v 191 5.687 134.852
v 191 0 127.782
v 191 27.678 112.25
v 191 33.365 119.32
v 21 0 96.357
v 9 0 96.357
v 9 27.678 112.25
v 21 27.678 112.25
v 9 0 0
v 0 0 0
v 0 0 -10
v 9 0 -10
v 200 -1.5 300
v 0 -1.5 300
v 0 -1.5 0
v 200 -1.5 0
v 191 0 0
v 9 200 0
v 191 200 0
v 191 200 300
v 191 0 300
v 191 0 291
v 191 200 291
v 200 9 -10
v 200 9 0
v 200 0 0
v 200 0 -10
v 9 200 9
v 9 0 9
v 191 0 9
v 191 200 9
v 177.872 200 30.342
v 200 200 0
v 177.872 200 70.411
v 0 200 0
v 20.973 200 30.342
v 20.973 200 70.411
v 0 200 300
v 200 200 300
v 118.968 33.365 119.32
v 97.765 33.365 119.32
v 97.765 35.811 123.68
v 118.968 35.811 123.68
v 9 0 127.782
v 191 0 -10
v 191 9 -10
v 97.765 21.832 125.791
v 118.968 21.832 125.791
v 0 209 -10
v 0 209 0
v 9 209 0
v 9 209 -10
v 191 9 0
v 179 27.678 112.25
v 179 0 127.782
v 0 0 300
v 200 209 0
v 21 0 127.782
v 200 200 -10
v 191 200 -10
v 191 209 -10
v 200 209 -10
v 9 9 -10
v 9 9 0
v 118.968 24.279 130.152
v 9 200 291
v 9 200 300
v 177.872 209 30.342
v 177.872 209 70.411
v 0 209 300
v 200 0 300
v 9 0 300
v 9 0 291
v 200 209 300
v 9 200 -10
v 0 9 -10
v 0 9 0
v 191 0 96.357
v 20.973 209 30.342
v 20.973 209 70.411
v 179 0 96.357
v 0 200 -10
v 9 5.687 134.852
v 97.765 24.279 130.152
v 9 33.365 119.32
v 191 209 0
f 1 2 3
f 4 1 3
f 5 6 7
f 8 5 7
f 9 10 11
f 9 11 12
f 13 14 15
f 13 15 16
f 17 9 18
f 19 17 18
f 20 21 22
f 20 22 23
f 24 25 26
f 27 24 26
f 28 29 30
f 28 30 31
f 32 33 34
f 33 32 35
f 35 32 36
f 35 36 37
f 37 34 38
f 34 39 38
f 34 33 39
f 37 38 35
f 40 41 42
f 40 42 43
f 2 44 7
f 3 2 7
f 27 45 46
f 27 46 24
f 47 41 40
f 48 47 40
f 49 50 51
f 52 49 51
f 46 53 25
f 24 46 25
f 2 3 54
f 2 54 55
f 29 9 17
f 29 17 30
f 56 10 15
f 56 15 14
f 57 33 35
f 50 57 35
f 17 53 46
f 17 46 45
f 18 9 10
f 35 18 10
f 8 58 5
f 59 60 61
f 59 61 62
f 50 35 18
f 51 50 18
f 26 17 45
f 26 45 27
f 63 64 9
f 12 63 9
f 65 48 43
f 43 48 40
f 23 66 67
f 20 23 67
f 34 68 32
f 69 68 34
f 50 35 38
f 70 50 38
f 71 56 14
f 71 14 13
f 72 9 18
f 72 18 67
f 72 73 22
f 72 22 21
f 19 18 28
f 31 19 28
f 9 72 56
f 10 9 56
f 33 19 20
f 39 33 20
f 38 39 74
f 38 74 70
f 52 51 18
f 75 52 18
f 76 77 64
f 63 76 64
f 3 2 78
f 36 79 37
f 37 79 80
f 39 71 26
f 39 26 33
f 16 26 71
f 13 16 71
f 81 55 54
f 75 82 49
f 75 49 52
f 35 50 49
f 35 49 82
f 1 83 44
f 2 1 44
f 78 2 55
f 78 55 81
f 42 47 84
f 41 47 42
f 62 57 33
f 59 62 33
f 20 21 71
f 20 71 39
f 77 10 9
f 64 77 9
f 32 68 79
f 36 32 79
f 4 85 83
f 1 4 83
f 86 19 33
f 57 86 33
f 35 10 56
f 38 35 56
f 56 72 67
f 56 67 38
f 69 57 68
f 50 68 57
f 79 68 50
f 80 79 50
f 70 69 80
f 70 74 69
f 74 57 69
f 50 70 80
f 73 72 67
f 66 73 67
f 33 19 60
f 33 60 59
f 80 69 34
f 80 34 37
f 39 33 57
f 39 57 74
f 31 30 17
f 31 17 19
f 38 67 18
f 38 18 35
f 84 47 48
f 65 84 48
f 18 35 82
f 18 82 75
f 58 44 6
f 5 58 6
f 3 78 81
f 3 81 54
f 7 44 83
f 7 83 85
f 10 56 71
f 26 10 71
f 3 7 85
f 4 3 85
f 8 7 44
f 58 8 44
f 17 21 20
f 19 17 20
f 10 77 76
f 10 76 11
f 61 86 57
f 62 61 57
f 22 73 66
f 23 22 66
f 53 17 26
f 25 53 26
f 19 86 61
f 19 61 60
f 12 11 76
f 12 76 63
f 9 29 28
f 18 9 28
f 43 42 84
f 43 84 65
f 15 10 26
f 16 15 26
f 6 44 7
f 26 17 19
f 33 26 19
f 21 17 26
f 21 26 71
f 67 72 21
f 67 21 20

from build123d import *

# Parameters (mm, degrees)
F0_W      = 200
F0_H      = 300
F1_DEPTH  = 1.5
F2_W      = 9
F2_H      = 300
F3_DEPTH  = 200
F5_DEPTH  = 12
F7_DEPTH  = 182
F8_W      = 21.2037339807
F8_H      = 13.2238465644
F9_DEPTH  = 5
F11_DEPTH = 12
F12_W     = 200
F12_H     = 9
F13_DEPTH = 182
F14_W     = 200
F14_H     = 9
F15_DEPTH = 182
F16_W     = 200
F16_H     = 300
F17_DEPTH = 9
F18_W     = 200
F18_H     = 300
F19_DEPTH = 9
F20_W     = 156.8991802633
F20_H     = 40.0696396828
F21_DEPTH = 9
F22_W     = 9
F22_H     = 9
F23_DEPTH = 10


with BuildPart() as f1:
    # F0 (on Front) → F1 (new body)
    with BuildSketch(Plane.XZ):
        with Locations((100, 150)):
            Rectangle(F0_W, F0_H)
    extrude(amount=F1_DEPTH)


with BuildPart() as f3:
    # F2 (on face) → F3 (new body)
    with BuildSketch(Plane(origin=(0, 0, 0), x_dir=(-1, 0, 0), z_dir=(0, 1, 0))):
        with Locations((-4.5, 150)):
            Rectangle(F2_W, F2_H)
    extrude(amount=F3_DEPTH)


with BuildPart() as f5:
    # F4 (on face) → F5 (new body)
    with BuildSketch(Plane.YZ.offset(9)):
        Polygon((0, 127.7815699577), (0, 96.3572561741), (27.6775900275, 112.250007689), align=None)
    extrude(amount=F5_DEPTH)


with BuildPart() as f7:
    # F6 (on face) → F7 (new body)
    with BuildSketch(Plane.YZ.offset(9)):
        Polygon((0, 127.7815699577), (27.6775900275, 112.250007689), (33.3645287901, 119.3200424314), (5.6869387627, 134.8516047001), align=None)
    extrude(amount=F7_DEPTH)


with BuildPart() as f9:
    # F8 (on face) → F9 (new body)
    with BuildSketch(Plane(origin=(0, 58.9125639544, 104.9835016197), x_dir=(1, 0, 0), z_dir=(0, 0.489373421, 0.8720743402))):
        with Locations((108.366433531, -35.9076312136)):
            Rectangle(F8_W, F8_H)
    extrude(amount=F9_DEPTH)


with BuildPart() as f11:
    # F10 (on face) → F11 (new body)
    with BuildSketch(Plane.YZ.offset(191)):
        Polygon((0, 127.7815699577), (0, 96.3572561741), (27.6775900275, 112.250007689), align=None)
    extrude(amount=-F11_DEPTH)


with BuildPart() as f13:
    # F12 (on face) → F13 (new body)
    with BuildSketch(Plane.YZ.offset(9)):
        with Locations((100, 295.5)):
            Rectangle(F12_W, F12_H)
    extrude(amount=F13_DEPTH)


with BuildPart() as f15:
    # F14 (on face) → F15 (new body)
    with BuildSketch(Plane.YZ.offset(9)):
        with Locations((100, 4.5)):
            Rectangle(F14_W, F14_H)
    extrude(amount=F15_DEPTH)


with BuildPart() as f17:
    # F16 (on face) → F17 (new body)
    with BuildSketch(Plane.YZ.offset(191)):
        with Locations((100, 150)):
            Rectangle(F16_W, F16_H)
    extrude(amount=F17_DEPTH)


with BuildPart() as f19:
    # F18 (on face) → F19 (new body)
    with BuildSketch(Plane(origin=(0, 200, 0), x_dir=(-1, 0, 0), z_dir=(0, 1, 0))):
        with Locations((-100, 150)):
            Rectangle(F18_W, F18_H)
    extrude(amount=F19_DEPTH)

    # F20 (on face) → F21 (cut)
    with BuildSketch(Plane(origin=(0, 209, 0), x_dir=(-1, 0, 0), z_dir=(0, 1, 0))):
        with Locations((-99.422307685, 50.3766164184)):
            Rectangle(F20_W, F20_H)
    extrude(amount=-F21_DEPTH, mode=Mode.SUBTRACT)


with BuildPart() as f23:
    # F22 (on face) → F23 (new body)
    with BuildSketch(Plane(origin=(0, 0, 0), x_dir=(1, 0, 0), z_dir=(0, 0, -1))):
        with Locations((195.5, -4.5)):
            Rectangle(F22_W, F22_H)
    extrude(amount=F23_DEPTH)


with BuildPart() as f23b:
    # F22 (on face) → F23, piece 2 (new body)
    with BuildSketch(Plane(origin=(0, 0, 0), x_dir=(1, 0, 0), z_dir=(0, 0, -1))):
        with Locations((195.5, -204.5)):
            Rectangle(F22_W, F22_H)
    extrude(amount=F23_DEPTH)


with BuildPart() as f23c:
    # F22 (on face) → F23, piece 3 (new body)
    with BuildSketch(Plane(origin=(0, 0, 0), x_dir=(1, 0, 0), z_dir=(0, 0, -1))):
        with Locations((4.5, -204.5)):
            Rectangle(F22_W, F22_H)
    extrude(amount=F23_DEPTH)


with BuildPart() as f23d:
    # F22 (on face) → F23, piece 4 (new body)
    with BuildSketch(Plane(origin=(0, 0, 0), x_dir=(1, 0, 0), z_dir=(0, 0, -1))):
        with Locations((4.5, -4.5)):
            Rectangle(F22_W, F22_H)
    extrude(amount=F23_DEPTH)


solid = Compound([f1.part, f3.part, f5.part, f7.part, f9.part, f11.part, f13.part, f15.part, f17.part, f19.part, f23.part, f23b.part, f23c.part, f23d.part])
